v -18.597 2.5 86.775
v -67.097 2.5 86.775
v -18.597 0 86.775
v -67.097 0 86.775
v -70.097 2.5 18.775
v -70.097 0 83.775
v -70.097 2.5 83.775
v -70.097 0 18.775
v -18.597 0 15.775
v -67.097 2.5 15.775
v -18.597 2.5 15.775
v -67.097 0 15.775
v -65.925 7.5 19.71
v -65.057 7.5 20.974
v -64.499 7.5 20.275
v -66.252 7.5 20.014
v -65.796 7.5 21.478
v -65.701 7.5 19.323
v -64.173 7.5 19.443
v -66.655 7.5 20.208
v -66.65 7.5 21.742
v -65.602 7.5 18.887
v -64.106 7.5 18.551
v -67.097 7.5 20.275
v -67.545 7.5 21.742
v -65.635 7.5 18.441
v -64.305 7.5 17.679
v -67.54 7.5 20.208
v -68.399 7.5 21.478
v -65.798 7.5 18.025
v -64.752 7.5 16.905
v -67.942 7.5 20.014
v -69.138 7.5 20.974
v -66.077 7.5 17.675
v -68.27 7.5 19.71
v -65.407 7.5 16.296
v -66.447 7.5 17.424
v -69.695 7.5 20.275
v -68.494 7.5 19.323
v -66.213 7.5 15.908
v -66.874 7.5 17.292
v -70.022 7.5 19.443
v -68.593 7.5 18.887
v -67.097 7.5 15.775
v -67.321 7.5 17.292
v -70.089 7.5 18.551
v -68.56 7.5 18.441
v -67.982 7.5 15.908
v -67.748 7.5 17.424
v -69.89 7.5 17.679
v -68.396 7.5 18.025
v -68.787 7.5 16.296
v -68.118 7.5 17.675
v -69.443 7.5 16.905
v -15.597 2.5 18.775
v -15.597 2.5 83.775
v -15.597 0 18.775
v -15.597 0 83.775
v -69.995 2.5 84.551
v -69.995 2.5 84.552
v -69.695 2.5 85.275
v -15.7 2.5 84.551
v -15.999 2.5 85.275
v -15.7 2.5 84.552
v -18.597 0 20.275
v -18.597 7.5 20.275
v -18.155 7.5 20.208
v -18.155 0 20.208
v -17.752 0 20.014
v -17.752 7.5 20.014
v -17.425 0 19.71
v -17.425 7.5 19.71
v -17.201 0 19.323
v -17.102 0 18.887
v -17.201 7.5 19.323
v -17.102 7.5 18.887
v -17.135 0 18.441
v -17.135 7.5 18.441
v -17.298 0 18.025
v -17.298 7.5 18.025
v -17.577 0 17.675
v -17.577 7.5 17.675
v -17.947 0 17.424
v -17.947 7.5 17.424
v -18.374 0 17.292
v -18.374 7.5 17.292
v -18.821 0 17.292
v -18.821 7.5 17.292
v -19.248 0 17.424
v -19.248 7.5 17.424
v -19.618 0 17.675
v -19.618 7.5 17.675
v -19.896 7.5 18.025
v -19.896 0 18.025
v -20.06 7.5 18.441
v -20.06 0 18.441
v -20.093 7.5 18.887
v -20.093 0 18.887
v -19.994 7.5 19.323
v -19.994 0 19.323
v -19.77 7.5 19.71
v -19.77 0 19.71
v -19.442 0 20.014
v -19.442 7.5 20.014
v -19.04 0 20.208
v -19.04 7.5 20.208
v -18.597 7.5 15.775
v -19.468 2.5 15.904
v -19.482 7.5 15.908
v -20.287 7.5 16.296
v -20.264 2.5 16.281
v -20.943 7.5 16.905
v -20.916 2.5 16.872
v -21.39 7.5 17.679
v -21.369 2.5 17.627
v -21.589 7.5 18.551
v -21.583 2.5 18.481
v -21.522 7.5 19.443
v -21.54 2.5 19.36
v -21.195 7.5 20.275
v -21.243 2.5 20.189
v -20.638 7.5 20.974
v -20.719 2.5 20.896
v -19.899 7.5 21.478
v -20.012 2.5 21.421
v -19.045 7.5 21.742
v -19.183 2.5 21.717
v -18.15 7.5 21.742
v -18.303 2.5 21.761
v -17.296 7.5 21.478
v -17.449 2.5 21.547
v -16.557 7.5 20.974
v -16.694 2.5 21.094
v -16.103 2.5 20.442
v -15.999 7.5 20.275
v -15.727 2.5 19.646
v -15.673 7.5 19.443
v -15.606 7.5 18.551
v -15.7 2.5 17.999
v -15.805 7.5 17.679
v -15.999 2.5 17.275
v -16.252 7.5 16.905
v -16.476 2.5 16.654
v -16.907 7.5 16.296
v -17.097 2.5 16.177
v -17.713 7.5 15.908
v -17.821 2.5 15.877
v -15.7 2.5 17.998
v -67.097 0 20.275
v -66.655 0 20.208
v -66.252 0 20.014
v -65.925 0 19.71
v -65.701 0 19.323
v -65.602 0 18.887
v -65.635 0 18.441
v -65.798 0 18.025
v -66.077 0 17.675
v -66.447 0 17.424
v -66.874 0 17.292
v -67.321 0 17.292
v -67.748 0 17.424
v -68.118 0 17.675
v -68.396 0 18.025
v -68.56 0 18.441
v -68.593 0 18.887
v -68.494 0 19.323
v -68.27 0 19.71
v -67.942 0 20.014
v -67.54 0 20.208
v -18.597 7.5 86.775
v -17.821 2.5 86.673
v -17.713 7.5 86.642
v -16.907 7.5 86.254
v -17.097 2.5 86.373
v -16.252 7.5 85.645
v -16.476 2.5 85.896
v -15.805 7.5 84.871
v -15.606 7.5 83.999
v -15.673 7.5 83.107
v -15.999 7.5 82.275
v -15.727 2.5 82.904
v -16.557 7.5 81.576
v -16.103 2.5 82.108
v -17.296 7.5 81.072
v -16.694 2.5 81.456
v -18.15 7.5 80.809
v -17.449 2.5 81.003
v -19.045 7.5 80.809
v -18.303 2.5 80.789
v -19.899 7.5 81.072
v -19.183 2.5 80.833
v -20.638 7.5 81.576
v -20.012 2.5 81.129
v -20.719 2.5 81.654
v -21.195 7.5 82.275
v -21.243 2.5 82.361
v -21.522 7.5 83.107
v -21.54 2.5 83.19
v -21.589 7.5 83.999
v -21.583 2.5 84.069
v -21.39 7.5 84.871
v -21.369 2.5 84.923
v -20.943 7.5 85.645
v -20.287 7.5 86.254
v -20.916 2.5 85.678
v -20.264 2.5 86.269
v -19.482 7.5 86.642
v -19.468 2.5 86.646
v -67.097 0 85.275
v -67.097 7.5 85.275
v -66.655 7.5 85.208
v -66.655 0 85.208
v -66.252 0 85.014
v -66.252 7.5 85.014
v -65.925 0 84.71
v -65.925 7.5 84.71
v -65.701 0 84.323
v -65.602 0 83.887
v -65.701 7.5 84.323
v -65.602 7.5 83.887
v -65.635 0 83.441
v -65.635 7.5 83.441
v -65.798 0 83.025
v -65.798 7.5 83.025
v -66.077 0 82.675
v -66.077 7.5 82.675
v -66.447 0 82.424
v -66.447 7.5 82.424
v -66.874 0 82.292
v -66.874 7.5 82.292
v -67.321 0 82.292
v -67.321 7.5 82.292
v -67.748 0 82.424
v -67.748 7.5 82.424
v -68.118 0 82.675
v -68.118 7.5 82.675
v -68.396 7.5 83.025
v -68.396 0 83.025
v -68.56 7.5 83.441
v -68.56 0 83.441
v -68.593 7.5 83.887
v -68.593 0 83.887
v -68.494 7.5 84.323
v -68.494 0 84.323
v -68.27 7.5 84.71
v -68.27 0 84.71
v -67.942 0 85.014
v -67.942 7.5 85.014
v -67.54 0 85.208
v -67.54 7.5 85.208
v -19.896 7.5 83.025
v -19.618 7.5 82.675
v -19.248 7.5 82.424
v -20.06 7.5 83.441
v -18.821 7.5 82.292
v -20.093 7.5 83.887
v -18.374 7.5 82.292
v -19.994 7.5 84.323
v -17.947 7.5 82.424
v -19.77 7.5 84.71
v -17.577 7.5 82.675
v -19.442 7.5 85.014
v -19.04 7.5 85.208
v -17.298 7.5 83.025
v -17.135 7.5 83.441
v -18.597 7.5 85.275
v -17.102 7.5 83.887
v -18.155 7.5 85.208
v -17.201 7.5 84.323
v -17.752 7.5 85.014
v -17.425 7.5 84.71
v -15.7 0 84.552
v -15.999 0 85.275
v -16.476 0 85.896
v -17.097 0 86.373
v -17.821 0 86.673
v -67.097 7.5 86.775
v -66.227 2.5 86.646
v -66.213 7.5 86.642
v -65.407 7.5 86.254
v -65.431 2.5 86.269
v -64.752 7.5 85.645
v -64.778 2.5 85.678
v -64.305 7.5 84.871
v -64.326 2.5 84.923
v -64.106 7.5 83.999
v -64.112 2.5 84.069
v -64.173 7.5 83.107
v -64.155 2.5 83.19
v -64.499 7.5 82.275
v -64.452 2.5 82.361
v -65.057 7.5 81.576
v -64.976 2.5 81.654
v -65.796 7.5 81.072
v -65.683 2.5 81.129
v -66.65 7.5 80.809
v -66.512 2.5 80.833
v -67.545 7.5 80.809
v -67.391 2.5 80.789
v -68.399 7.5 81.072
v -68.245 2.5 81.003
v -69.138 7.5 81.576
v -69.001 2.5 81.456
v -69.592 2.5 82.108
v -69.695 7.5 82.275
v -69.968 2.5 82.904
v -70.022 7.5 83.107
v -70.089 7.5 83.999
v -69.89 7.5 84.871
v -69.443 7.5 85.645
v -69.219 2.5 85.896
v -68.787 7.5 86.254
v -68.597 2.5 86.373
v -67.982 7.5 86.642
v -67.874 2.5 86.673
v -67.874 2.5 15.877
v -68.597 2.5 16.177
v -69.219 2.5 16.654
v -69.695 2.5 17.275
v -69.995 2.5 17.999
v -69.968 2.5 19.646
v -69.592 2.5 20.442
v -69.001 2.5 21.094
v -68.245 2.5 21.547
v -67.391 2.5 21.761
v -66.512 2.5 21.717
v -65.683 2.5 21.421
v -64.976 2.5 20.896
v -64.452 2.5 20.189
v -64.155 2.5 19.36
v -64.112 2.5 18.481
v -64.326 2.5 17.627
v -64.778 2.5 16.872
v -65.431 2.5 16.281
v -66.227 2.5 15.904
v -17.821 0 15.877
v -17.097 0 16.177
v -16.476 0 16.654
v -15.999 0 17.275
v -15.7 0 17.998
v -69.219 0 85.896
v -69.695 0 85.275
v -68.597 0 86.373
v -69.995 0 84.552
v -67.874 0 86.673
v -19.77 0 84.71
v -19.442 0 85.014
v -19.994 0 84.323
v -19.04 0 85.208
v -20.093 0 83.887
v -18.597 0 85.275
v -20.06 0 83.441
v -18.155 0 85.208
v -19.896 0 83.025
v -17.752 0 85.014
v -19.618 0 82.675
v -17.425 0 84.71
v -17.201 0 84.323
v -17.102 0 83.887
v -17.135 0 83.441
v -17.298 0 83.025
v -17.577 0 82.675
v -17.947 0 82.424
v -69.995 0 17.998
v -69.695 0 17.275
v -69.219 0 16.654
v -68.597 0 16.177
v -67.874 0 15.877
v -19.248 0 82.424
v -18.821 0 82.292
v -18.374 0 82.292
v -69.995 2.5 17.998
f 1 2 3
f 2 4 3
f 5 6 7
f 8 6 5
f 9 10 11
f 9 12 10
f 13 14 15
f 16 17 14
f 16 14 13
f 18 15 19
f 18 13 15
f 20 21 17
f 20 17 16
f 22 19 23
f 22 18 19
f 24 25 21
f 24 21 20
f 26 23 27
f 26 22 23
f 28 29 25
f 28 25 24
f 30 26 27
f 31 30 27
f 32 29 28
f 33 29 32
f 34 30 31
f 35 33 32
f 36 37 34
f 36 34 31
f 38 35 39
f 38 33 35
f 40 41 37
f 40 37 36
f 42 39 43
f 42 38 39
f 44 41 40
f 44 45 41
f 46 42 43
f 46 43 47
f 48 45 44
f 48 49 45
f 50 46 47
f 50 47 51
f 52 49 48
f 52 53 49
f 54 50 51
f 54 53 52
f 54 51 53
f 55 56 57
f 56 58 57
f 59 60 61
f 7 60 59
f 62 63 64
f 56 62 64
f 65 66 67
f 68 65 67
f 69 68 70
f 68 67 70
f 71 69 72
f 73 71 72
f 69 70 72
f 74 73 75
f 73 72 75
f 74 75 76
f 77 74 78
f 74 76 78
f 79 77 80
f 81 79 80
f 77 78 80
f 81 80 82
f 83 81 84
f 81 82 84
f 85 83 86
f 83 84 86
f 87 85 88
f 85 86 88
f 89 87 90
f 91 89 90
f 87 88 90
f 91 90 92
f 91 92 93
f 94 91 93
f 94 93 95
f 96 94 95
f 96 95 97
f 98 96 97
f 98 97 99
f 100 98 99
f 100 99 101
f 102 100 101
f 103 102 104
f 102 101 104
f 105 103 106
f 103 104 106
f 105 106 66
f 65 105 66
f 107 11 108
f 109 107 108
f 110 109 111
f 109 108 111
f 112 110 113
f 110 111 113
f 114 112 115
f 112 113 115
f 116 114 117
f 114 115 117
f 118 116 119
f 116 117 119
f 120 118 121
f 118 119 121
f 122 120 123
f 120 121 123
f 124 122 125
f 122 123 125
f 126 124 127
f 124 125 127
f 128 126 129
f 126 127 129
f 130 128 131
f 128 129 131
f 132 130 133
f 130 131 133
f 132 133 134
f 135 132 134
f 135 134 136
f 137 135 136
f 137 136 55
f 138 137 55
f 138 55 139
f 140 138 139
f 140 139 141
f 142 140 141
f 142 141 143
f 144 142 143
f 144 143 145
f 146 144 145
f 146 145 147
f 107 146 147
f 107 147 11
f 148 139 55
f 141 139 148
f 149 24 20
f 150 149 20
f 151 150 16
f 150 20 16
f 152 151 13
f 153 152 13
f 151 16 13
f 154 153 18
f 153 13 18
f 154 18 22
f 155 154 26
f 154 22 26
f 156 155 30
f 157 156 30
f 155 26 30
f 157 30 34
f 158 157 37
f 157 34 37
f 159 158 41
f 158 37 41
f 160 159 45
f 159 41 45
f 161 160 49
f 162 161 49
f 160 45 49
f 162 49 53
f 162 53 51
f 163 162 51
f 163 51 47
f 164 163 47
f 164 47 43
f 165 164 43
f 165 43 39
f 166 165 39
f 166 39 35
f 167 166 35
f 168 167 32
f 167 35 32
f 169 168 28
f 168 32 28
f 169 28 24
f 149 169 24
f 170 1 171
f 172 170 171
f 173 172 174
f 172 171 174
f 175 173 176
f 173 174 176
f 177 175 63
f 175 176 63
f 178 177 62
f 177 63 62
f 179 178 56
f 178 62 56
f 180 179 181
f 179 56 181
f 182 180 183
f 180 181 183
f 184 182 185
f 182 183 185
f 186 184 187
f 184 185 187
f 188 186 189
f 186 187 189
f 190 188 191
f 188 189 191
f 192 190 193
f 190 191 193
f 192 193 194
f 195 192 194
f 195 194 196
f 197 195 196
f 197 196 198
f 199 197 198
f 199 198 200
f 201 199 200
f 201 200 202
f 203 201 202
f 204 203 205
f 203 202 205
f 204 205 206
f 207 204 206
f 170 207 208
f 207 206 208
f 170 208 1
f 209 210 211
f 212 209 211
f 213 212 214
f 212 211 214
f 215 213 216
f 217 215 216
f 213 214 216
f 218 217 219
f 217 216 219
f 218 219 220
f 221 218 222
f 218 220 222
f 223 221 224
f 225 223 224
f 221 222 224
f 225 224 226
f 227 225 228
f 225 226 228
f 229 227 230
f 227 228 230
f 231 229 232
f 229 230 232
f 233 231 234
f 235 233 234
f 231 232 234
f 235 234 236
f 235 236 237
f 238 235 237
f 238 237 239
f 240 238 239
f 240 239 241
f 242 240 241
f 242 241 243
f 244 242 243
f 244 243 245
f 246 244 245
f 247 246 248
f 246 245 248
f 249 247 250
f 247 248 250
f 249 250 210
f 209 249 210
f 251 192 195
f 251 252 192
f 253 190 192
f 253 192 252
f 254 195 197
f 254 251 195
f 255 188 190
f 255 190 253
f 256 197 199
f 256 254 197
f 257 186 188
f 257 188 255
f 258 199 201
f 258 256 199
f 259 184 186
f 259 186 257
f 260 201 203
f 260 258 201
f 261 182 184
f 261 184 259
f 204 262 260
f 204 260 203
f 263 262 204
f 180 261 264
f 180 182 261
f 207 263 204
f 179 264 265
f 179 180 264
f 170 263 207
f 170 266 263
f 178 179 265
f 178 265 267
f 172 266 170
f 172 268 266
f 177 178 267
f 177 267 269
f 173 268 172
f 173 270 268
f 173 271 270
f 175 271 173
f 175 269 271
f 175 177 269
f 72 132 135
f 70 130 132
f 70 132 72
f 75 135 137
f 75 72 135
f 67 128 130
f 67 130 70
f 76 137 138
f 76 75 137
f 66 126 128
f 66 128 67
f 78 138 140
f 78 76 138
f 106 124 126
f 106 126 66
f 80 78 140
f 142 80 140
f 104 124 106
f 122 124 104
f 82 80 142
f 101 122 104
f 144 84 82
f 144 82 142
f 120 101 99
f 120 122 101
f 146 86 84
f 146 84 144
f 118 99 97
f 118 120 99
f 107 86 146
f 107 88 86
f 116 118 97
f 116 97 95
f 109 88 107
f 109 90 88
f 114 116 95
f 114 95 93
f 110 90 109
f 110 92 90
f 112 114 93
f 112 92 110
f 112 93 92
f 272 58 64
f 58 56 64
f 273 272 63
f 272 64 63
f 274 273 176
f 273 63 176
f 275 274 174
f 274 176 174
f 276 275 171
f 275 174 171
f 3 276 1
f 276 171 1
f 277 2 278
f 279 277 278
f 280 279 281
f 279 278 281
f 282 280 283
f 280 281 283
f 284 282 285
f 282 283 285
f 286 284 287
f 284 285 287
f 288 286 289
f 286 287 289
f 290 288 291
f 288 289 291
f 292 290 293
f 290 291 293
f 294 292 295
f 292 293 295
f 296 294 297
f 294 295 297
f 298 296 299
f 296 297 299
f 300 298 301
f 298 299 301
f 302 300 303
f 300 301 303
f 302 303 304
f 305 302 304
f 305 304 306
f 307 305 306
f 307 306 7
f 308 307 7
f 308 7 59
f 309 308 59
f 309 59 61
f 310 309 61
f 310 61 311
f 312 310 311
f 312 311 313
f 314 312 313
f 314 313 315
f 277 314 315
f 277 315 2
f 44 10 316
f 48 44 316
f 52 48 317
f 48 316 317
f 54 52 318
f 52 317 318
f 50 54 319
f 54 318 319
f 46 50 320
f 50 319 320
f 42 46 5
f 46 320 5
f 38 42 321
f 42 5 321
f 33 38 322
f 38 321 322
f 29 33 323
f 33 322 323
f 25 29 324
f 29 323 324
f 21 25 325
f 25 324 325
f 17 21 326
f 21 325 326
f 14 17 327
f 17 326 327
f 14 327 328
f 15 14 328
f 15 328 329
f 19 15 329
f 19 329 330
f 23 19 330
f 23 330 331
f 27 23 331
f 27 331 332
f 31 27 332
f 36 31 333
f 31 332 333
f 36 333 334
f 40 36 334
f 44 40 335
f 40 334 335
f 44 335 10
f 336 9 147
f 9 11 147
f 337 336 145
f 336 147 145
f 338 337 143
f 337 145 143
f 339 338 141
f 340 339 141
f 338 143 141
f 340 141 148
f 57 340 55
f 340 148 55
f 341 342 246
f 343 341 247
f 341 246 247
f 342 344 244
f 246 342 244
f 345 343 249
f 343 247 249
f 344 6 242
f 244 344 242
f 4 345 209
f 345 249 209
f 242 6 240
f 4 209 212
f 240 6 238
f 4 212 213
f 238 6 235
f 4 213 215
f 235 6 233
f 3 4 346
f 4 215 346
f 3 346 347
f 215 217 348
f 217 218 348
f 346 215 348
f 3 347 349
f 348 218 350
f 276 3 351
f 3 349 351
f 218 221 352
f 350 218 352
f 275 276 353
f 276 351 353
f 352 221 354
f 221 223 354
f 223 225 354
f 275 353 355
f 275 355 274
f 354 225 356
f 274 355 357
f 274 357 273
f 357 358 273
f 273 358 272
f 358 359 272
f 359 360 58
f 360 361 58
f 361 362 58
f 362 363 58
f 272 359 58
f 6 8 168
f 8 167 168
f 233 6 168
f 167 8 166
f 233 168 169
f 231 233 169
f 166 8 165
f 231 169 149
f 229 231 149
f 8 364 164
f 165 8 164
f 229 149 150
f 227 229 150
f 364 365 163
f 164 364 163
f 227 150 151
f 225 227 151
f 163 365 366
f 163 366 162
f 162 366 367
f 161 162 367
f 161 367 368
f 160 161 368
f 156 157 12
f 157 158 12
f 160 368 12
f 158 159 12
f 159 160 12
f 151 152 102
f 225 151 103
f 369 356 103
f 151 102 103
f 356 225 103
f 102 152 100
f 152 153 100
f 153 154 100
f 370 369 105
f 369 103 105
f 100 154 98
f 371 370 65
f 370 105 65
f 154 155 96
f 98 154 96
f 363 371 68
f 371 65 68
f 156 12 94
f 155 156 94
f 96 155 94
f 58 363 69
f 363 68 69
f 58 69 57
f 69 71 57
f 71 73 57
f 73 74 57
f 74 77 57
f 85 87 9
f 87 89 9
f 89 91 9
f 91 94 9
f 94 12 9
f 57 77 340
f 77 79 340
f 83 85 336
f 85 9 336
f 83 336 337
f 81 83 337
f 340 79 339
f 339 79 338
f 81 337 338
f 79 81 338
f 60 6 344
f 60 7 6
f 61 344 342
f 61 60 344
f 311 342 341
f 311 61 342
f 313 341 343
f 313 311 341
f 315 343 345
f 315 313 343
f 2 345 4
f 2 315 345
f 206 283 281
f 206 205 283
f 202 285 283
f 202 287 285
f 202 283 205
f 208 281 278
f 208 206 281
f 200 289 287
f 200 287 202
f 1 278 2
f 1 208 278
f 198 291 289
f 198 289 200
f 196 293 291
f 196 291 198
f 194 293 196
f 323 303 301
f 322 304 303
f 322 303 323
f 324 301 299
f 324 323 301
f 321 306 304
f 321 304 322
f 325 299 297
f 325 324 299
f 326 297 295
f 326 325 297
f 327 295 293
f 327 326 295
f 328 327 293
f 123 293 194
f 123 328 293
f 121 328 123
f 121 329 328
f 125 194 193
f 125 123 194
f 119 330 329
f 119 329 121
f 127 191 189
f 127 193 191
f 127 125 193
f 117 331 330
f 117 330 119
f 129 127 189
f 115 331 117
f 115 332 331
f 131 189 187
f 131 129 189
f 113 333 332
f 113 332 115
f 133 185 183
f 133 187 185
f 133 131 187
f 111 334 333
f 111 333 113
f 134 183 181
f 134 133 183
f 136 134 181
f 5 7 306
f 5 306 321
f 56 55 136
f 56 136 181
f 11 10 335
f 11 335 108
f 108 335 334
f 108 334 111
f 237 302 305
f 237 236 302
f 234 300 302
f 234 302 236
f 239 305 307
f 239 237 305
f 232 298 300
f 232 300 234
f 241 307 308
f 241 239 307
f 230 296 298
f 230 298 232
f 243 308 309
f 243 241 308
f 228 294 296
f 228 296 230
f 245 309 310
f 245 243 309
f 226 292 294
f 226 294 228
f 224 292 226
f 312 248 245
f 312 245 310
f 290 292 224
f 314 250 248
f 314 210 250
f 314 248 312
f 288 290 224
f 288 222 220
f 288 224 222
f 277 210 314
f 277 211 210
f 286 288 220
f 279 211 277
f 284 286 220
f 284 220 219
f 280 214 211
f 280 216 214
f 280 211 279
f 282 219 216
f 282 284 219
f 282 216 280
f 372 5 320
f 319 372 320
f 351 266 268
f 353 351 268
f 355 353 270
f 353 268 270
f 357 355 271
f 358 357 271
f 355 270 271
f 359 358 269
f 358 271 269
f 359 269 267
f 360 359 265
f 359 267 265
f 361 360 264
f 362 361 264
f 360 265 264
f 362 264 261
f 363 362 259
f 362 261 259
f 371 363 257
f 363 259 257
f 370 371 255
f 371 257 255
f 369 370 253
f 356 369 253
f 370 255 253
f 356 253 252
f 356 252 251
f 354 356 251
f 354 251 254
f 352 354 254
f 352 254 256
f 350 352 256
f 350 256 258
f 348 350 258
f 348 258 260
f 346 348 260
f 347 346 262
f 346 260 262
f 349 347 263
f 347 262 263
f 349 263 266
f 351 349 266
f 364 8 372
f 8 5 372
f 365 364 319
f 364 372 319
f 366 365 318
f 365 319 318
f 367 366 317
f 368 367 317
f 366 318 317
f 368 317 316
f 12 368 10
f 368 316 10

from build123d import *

# Parameters (mm, degrees)
SKETCH1_W           = 54.5
SKETCH1_H           = 71
BOSS_EXTRUDE1_DEPTH = 2.5
SKETCH2_R           = 3
BOSS_EXTRUDE2_DEPTH = 5
FILLET1_R           = 3
SKETCH3_R           = 1.5
CUT_EXTRUDE1_DEPTH  = 7.5


with BuildPart() as part:
    # Sketch1 → Boss-Extrude1 (new body)
    with BuildSketch(Plane(origin=(0, 0, 0), x_dir=(1, 0, 0), z_dir=(0, 1, 0))):
        with Locations((-42.847381712, -51.275024631)):
            Rectangle(SKETCH1_W, SKETCH1_H)
    extrude(amount=BOSS_EXTRUDE1_DEPTH)

    # Sketch2 → Boss-Extrude2 (add)
    with BuildSketch(Plane(origin=(0, 2.5, 0), x_dir=(1, 0, 0), z_dir=(0, 1, 0))):
        with Locations(Location((-67.097381712, -18.775024631, 0), (0, 0, 90))):
            Circle(SKETCH2_R)
        with Locations(Location((-18.597381712, -18.775024631, 0), (0, 0, 90))):
            Circle(SKETCH2_R)
        with Locations(Location((-18.597381712, -83.775024631, 0), (0, 0, 270))):
            Circle(SKETCH2_R)
        with Locations(Location((-67.097381712, -83.775024631, 0), (0, 0, 270))):
            Circle(SKETCH2_R)
    extrude(amount=BOSS_EXTRUDE2_DEPTH)

    # Fillet1
    fillet1_edges = [part.edges().sort_by_distance(p)[0] for p in [
        (-70.097381712, 1.25, 15.775024631),
        (-15.597381712, 1.25, 15.775024631),
        (-15.597381712, 1.25, 86.775024631),
        (-70.097381712, 1.25, 86.775024631),
    ]]
    fillet(fillet1_edges, radius=FILLET1_R - 0.0001)  # a hair under: the kernel refuses the full size

    # Sketch3 → Cut-Extrude1 (cut)
    with BuildSketch(Plane(origin=(0, 7.5, 0), x_dir=(1, 0, 0), z_dir=(0, 1, 0))):
        with Locations(Location((-67.097381712, -18.775024631, 0), (0, 0, 270))):
            Circle(SKETCH3_R)
        with Locations(Location((-18.597381712, -18.775024631, 0), (0, 0, 270))):
            Circle(SKETCH3_R)
        with Locations(Location((-18.597381712, -83.775024631, 0), (0, 0, 270))):
            Circle(SKETCH3_R)
        with Locations(Location((-67.097381712, -83.775024631, 0), (0, 0, 270))):
            Circle(SKETCH3_R)
    extrude(amount=-CUT_EXTRUDE1_DEPTH, mode=Mode.SUBTRACT)


solid = part.part
